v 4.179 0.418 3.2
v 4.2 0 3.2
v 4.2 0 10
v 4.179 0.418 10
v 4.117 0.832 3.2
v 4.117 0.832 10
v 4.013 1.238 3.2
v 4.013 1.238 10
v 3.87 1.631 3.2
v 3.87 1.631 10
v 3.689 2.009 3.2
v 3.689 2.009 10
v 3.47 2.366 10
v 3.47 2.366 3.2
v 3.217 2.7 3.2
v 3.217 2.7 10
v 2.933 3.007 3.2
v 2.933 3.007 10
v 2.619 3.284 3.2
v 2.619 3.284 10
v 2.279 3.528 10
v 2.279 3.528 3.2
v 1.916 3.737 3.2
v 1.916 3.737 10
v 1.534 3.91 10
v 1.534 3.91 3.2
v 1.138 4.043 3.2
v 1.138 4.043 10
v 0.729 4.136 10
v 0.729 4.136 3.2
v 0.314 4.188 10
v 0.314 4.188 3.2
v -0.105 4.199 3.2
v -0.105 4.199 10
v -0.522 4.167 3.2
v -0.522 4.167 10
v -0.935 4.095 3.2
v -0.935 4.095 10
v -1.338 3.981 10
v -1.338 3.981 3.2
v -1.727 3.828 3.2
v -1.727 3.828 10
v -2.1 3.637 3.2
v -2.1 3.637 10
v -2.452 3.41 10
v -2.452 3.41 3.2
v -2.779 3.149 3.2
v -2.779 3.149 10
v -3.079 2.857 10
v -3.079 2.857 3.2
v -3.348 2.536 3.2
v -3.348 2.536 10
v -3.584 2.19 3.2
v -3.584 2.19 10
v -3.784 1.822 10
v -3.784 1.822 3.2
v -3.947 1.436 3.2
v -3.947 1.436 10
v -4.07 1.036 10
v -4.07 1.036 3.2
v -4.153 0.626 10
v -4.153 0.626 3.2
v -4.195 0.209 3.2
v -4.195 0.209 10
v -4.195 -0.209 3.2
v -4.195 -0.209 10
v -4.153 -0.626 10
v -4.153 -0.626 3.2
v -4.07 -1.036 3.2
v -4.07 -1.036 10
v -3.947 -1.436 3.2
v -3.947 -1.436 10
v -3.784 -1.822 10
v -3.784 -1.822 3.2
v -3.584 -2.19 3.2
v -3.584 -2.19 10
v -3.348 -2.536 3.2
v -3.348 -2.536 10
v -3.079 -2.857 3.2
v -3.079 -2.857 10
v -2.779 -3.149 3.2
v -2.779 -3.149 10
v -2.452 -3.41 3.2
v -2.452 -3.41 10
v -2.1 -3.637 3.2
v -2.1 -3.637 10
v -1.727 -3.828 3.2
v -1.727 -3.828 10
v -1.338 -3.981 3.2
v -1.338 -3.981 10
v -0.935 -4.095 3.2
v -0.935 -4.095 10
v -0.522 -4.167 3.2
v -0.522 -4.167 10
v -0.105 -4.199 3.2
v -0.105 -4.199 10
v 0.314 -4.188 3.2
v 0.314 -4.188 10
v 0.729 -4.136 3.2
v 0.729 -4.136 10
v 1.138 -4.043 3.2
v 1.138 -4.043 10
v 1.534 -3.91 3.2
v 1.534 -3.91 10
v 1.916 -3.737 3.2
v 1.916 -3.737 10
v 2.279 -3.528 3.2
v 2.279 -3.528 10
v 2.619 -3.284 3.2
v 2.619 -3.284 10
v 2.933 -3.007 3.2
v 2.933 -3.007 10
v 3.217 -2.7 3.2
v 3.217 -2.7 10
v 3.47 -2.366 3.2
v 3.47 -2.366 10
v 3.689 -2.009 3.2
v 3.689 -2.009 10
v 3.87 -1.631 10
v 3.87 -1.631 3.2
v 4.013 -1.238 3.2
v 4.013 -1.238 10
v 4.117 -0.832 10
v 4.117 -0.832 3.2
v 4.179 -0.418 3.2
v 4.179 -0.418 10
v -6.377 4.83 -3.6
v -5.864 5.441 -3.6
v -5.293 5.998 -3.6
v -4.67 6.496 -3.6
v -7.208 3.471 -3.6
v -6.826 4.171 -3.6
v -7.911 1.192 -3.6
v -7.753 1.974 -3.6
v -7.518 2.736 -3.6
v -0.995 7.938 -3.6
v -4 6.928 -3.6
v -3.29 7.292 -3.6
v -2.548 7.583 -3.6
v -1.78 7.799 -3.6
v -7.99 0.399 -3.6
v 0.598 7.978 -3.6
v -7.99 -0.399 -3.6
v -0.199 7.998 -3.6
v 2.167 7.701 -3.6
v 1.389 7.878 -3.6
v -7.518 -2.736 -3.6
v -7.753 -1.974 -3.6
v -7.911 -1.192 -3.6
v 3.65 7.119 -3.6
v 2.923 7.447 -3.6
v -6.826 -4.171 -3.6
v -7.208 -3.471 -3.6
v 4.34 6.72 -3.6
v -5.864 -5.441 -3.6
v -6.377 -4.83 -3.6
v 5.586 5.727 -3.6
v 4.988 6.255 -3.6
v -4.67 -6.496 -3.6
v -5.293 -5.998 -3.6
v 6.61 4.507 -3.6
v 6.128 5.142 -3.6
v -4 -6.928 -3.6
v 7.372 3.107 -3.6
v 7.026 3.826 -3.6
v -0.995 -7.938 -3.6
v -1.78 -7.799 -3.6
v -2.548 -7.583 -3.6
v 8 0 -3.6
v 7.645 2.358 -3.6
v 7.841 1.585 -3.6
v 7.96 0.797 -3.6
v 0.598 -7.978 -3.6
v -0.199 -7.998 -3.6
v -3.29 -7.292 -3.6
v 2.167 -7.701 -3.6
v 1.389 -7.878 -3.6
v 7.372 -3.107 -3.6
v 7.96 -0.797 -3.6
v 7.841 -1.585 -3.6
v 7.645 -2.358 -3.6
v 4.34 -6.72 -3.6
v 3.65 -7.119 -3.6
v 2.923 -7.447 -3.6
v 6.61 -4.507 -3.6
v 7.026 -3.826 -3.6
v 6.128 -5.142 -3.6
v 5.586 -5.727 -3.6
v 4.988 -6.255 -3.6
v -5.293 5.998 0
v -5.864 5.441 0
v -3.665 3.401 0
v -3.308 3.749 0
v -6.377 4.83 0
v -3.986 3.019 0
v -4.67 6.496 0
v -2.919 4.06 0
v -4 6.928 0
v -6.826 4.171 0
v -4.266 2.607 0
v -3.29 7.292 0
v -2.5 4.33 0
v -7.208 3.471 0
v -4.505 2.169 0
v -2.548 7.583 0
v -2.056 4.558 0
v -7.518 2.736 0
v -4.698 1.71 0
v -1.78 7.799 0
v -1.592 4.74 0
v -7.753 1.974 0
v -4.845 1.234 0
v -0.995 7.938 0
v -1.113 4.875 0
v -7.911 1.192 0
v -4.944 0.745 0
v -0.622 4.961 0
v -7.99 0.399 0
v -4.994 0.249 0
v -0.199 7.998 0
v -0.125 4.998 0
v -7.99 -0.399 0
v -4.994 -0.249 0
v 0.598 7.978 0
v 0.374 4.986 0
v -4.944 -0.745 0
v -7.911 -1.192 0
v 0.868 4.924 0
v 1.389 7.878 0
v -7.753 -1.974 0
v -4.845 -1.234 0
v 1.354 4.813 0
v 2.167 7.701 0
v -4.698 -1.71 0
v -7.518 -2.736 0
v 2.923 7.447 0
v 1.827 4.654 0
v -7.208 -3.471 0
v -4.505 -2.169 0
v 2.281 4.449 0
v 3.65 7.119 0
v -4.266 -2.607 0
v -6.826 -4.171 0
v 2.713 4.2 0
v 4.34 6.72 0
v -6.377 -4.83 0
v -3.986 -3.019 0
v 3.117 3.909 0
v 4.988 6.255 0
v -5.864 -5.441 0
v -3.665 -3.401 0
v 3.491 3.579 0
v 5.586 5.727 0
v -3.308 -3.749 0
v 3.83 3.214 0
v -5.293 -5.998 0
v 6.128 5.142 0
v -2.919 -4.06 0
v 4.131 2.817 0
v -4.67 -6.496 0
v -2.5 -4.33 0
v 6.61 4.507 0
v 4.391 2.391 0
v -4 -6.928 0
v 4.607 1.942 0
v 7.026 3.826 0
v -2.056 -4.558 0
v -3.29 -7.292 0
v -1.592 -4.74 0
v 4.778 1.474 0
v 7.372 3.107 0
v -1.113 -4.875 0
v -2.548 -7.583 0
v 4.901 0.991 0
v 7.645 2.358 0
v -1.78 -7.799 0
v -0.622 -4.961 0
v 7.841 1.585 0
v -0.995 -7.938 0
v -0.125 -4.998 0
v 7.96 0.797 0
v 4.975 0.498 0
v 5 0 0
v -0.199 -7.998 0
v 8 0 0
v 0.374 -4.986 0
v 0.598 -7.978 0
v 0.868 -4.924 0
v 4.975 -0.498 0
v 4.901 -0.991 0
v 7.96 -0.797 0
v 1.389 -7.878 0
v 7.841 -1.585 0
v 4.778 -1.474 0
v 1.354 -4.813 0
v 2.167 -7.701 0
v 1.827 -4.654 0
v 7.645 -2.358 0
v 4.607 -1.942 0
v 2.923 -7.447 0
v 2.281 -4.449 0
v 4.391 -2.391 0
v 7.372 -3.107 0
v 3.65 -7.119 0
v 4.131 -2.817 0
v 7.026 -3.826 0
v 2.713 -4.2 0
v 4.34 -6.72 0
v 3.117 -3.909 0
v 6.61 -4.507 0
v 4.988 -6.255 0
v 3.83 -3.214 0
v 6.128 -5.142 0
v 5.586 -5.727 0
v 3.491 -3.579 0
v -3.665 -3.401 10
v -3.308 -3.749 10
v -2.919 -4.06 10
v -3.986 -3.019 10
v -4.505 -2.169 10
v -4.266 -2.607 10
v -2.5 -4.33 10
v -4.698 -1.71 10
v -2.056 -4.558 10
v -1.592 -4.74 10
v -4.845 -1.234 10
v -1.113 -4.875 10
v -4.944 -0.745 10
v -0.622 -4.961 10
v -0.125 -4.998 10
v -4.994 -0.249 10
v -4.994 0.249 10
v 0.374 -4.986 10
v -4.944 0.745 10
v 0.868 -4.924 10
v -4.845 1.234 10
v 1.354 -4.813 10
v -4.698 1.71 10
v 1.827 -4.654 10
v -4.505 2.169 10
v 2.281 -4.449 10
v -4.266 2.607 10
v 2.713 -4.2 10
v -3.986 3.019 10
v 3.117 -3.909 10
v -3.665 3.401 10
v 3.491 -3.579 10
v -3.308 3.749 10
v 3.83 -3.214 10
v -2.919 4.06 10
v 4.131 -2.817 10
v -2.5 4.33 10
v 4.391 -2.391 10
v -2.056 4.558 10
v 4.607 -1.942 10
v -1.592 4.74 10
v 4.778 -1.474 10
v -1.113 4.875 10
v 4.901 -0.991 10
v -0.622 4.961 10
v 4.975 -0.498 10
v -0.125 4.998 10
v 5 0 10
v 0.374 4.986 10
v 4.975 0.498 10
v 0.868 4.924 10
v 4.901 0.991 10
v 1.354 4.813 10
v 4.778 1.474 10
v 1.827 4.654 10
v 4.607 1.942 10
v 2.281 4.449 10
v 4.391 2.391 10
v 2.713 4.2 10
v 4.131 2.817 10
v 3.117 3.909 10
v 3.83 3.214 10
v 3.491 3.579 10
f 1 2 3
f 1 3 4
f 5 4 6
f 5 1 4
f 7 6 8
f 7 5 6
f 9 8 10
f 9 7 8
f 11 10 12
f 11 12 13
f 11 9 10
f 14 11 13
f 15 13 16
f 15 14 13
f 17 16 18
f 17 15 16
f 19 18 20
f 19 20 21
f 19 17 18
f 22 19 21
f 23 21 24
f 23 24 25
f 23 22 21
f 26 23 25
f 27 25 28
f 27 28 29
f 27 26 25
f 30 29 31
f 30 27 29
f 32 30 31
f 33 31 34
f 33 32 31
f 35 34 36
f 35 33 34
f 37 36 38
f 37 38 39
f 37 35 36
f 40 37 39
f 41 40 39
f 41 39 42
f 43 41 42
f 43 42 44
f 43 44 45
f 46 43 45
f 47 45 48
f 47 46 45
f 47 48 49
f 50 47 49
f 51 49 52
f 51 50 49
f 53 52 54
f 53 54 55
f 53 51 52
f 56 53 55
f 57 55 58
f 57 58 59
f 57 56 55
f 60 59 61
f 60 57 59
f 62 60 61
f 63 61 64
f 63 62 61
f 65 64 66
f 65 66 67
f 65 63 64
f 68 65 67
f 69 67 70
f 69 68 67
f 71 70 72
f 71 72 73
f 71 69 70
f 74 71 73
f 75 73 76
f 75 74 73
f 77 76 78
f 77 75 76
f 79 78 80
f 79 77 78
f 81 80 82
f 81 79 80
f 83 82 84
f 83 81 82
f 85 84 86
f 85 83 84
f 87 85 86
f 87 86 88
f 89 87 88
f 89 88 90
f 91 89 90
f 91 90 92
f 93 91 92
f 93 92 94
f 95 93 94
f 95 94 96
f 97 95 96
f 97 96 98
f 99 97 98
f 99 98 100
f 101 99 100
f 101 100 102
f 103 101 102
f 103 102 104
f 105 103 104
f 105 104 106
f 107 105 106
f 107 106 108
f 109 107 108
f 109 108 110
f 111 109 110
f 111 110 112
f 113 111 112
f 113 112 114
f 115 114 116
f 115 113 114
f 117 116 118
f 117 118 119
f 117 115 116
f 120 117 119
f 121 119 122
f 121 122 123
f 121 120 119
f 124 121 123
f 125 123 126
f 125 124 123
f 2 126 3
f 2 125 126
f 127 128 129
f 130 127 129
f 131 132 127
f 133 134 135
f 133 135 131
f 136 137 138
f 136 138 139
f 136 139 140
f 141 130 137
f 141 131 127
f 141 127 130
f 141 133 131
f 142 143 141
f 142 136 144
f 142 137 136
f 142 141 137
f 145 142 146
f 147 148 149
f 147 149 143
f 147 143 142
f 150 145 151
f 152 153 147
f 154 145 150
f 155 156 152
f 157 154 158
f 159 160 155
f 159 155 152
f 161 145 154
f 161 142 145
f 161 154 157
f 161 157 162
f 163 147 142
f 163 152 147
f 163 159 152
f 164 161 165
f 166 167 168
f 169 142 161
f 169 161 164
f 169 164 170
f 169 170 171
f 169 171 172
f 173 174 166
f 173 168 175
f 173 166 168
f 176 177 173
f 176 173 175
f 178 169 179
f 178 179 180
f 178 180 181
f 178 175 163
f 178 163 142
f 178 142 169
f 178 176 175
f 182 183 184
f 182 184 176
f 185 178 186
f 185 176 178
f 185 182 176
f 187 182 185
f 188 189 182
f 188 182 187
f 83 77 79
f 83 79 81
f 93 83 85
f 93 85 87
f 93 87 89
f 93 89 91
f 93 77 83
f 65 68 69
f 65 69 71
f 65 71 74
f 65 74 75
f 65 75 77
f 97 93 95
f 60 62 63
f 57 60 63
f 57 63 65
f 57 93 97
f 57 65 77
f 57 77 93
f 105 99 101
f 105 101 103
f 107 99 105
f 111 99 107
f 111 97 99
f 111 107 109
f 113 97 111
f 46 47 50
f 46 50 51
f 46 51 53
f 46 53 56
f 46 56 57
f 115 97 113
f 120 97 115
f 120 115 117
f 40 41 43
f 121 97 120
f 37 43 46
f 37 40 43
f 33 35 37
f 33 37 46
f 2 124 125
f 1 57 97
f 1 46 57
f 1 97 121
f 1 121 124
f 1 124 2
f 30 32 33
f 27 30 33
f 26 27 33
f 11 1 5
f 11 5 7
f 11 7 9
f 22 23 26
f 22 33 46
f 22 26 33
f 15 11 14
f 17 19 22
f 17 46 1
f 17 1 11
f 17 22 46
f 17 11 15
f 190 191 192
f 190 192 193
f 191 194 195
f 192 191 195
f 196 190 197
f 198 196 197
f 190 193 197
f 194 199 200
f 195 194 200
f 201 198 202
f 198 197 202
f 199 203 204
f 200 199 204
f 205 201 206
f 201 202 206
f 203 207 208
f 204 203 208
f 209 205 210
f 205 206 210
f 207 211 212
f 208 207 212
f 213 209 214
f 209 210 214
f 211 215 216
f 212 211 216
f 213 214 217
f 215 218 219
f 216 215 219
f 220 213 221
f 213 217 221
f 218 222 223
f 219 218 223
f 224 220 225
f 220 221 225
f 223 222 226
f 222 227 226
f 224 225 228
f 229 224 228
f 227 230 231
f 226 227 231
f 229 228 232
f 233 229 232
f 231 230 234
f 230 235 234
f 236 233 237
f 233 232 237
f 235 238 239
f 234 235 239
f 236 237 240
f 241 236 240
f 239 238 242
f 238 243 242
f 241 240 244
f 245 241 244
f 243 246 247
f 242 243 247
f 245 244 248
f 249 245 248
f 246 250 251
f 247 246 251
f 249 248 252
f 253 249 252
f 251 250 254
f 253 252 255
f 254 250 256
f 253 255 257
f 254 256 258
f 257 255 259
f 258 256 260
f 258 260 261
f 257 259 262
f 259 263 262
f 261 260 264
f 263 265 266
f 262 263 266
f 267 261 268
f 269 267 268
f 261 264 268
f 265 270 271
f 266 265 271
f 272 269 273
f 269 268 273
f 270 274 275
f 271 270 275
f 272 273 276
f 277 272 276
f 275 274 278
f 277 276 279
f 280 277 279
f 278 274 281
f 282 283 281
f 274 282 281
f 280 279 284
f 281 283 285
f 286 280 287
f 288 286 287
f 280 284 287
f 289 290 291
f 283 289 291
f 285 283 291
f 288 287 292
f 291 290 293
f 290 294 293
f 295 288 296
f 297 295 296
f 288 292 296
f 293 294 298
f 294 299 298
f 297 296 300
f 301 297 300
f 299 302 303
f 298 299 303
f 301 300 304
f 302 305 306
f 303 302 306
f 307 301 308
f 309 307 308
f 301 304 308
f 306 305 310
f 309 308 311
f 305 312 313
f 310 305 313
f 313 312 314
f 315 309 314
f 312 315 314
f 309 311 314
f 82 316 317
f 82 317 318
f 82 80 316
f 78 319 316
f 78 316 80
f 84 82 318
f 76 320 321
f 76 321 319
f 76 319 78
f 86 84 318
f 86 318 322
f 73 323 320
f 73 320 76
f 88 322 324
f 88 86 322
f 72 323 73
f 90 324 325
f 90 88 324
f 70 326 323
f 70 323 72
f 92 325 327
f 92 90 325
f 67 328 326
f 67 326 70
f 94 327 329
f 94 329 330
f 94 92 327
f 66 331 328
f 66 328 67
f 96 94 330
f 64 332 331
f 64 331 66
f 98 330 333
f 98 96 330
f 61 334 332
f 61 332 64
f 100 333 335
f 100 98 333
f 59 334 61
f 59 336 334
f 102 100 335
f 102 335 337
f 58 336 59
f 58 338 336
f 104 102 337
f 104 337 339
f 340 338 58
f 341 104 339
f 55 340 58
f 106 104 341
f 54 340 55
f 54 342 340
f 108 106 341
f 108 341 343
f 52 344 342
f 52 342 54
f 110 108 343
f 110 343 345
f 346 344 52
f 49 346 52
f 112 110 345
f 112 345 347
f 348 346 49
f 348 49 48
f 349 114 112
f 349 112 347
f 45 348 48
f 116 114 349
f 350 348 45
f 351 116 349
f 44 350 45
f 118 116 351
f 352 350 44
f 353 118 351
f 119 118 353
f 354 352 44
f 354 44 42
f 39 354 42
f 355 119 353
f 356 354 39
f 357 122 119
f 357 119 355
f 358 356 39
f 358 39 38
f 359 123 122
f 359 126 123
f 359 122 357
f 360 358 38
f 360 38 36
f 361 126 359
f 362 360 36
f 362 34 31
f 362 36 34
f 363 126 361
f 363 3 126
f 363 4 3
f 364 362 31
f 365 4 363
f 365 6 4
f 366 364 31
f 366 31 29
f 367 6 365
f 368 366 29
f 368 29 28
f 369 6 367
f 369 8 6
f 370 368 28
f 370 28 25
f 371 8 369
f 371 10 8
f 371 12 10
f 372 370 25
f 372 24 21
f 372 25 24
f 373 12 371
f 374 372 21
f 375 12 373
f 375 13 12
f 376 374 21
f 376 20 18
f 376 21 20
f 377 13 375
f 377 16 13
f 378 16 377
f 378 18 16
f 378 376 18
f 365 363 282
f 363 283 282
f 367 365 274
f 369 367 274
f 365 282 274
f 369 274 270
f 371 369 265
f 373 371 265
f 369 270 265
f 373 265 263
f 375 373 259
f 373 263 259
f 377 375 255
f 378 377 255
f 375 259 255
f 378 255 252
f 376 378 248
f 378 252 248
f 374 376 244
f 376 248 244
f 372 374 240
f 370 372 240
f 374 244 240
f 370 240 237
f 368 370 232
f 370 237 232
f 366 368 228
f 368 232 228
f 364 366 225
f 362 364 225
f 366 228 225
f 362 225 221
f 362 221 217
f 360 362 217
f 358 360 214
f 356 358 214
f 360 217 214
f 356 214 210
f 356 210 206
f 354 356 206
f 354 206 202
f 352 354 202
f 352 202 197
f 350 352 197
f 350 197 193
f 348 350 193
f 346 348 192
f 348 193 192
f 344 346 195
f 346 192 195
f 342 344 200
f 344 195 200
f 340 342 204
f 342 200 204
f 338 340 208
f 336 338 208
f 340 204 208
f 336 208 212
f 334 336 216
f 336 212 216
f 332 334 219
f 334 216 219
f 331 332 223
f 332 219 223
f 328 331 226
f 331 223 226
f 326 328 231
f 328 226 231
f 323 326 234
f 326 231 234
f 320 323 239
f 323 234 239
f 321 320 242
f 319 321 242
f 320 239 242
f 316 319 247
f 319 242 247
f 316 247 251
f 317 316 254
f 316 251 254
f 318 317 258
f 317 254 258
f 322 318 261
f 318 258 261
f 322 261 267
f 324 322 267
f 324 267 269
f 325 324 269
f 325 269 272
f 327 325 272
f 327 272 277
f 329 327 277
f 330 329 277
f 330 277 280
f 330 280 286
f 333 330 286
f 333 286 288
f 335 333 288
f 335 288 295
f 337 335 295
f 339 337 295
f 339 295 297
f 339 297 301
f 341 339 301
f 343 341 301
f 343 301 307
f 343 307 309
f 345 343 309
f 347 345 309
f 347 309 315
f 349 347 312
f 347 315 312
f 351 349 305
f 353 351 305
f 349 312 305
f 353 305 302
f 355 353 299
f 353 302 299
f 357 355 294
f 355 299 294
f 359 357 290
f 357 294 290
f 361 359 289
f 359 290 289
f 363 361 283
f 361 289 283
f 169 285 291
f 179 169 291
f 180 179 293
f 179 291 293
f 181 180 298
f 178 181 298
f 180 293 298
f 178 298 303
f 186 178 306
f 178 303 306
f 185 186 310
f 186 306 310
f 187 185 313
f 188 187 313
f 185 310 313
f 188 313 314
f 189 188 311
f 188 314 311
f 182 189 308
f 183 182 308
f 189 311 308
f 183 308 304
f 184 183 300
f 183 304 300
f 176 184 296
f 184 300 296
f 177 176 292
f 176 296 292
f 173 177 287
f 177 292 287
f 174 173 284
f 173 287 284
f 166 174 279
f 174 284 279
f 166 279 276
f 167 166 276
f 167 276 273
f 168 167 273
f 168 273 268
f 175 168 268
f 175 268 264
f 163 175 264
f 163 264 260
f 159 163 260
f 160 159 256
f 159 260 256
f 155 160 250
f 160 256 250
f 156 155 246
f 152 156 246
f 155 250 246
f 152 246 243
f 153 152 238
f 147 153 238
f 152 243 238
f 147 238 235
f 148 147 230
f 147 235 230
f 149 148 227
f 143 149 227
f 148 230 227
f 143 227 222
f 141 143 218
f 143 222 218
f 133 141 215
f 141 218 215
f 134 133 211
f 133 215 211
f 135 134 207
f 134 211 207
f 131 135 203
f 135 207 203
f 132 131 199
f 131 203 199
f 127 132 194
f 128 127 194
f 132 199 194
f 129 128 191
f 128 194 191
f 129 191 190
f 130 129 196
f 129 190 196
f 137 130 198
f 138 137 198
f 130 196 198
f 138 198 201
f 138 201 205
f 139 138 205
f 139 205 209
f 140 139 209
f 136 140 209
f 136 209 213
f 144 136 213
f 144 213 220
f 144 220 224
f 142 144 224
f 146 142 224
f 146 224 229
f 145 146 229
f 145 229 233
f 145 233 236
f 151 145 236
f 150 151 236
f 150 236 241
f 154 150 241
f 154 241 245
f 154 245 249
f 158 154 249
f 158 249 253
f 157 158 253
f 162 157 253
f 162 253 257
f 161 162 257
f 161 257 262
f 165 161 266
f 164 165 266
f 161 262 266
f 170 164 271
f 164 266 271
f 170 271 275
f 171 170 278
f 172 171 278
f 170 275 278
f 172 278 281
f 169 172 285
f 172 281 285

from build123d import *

# Parameters (mm, degrees)
F0_R     = 5
F1_DEPTH = 3.2
F2_R     = 5
F2_R_2   = 4.2
F3_DEPTH = 6.8
F4_R     = 8
F4_R_2   = 5
F5_DEPTH = 3.6


with BuildPart() as f1:
    # F0 (on Top) → F1 (new body)
    with BuildSketch(Plane.XY):
        Circle(F0_R)
    extrude(amount=F1_DEPTH)

    # F2 (on face) → F3 (join)
    with BuildSketch(Plane.XY.offset(3.2)):
        Circle(F2_R)
        Circle(F2_R_2, mode=Mode.SUBTRACT)
    extrude(amount=F3_DEPTH)

    # F4 (on face) → F5 (join)
    with BuildSketch(Plane(origin=(0, 0, 0), x_dir=(1, 0, 0), z_dir=(0, 0, -1))):
        Circle(F4_R)
        Circle(F4_R_2, mode=Mode.SUBTRACT)
        Circle(F4_R_2)
    extrude(amount=F5_DEPTH)


solid = f1.part
